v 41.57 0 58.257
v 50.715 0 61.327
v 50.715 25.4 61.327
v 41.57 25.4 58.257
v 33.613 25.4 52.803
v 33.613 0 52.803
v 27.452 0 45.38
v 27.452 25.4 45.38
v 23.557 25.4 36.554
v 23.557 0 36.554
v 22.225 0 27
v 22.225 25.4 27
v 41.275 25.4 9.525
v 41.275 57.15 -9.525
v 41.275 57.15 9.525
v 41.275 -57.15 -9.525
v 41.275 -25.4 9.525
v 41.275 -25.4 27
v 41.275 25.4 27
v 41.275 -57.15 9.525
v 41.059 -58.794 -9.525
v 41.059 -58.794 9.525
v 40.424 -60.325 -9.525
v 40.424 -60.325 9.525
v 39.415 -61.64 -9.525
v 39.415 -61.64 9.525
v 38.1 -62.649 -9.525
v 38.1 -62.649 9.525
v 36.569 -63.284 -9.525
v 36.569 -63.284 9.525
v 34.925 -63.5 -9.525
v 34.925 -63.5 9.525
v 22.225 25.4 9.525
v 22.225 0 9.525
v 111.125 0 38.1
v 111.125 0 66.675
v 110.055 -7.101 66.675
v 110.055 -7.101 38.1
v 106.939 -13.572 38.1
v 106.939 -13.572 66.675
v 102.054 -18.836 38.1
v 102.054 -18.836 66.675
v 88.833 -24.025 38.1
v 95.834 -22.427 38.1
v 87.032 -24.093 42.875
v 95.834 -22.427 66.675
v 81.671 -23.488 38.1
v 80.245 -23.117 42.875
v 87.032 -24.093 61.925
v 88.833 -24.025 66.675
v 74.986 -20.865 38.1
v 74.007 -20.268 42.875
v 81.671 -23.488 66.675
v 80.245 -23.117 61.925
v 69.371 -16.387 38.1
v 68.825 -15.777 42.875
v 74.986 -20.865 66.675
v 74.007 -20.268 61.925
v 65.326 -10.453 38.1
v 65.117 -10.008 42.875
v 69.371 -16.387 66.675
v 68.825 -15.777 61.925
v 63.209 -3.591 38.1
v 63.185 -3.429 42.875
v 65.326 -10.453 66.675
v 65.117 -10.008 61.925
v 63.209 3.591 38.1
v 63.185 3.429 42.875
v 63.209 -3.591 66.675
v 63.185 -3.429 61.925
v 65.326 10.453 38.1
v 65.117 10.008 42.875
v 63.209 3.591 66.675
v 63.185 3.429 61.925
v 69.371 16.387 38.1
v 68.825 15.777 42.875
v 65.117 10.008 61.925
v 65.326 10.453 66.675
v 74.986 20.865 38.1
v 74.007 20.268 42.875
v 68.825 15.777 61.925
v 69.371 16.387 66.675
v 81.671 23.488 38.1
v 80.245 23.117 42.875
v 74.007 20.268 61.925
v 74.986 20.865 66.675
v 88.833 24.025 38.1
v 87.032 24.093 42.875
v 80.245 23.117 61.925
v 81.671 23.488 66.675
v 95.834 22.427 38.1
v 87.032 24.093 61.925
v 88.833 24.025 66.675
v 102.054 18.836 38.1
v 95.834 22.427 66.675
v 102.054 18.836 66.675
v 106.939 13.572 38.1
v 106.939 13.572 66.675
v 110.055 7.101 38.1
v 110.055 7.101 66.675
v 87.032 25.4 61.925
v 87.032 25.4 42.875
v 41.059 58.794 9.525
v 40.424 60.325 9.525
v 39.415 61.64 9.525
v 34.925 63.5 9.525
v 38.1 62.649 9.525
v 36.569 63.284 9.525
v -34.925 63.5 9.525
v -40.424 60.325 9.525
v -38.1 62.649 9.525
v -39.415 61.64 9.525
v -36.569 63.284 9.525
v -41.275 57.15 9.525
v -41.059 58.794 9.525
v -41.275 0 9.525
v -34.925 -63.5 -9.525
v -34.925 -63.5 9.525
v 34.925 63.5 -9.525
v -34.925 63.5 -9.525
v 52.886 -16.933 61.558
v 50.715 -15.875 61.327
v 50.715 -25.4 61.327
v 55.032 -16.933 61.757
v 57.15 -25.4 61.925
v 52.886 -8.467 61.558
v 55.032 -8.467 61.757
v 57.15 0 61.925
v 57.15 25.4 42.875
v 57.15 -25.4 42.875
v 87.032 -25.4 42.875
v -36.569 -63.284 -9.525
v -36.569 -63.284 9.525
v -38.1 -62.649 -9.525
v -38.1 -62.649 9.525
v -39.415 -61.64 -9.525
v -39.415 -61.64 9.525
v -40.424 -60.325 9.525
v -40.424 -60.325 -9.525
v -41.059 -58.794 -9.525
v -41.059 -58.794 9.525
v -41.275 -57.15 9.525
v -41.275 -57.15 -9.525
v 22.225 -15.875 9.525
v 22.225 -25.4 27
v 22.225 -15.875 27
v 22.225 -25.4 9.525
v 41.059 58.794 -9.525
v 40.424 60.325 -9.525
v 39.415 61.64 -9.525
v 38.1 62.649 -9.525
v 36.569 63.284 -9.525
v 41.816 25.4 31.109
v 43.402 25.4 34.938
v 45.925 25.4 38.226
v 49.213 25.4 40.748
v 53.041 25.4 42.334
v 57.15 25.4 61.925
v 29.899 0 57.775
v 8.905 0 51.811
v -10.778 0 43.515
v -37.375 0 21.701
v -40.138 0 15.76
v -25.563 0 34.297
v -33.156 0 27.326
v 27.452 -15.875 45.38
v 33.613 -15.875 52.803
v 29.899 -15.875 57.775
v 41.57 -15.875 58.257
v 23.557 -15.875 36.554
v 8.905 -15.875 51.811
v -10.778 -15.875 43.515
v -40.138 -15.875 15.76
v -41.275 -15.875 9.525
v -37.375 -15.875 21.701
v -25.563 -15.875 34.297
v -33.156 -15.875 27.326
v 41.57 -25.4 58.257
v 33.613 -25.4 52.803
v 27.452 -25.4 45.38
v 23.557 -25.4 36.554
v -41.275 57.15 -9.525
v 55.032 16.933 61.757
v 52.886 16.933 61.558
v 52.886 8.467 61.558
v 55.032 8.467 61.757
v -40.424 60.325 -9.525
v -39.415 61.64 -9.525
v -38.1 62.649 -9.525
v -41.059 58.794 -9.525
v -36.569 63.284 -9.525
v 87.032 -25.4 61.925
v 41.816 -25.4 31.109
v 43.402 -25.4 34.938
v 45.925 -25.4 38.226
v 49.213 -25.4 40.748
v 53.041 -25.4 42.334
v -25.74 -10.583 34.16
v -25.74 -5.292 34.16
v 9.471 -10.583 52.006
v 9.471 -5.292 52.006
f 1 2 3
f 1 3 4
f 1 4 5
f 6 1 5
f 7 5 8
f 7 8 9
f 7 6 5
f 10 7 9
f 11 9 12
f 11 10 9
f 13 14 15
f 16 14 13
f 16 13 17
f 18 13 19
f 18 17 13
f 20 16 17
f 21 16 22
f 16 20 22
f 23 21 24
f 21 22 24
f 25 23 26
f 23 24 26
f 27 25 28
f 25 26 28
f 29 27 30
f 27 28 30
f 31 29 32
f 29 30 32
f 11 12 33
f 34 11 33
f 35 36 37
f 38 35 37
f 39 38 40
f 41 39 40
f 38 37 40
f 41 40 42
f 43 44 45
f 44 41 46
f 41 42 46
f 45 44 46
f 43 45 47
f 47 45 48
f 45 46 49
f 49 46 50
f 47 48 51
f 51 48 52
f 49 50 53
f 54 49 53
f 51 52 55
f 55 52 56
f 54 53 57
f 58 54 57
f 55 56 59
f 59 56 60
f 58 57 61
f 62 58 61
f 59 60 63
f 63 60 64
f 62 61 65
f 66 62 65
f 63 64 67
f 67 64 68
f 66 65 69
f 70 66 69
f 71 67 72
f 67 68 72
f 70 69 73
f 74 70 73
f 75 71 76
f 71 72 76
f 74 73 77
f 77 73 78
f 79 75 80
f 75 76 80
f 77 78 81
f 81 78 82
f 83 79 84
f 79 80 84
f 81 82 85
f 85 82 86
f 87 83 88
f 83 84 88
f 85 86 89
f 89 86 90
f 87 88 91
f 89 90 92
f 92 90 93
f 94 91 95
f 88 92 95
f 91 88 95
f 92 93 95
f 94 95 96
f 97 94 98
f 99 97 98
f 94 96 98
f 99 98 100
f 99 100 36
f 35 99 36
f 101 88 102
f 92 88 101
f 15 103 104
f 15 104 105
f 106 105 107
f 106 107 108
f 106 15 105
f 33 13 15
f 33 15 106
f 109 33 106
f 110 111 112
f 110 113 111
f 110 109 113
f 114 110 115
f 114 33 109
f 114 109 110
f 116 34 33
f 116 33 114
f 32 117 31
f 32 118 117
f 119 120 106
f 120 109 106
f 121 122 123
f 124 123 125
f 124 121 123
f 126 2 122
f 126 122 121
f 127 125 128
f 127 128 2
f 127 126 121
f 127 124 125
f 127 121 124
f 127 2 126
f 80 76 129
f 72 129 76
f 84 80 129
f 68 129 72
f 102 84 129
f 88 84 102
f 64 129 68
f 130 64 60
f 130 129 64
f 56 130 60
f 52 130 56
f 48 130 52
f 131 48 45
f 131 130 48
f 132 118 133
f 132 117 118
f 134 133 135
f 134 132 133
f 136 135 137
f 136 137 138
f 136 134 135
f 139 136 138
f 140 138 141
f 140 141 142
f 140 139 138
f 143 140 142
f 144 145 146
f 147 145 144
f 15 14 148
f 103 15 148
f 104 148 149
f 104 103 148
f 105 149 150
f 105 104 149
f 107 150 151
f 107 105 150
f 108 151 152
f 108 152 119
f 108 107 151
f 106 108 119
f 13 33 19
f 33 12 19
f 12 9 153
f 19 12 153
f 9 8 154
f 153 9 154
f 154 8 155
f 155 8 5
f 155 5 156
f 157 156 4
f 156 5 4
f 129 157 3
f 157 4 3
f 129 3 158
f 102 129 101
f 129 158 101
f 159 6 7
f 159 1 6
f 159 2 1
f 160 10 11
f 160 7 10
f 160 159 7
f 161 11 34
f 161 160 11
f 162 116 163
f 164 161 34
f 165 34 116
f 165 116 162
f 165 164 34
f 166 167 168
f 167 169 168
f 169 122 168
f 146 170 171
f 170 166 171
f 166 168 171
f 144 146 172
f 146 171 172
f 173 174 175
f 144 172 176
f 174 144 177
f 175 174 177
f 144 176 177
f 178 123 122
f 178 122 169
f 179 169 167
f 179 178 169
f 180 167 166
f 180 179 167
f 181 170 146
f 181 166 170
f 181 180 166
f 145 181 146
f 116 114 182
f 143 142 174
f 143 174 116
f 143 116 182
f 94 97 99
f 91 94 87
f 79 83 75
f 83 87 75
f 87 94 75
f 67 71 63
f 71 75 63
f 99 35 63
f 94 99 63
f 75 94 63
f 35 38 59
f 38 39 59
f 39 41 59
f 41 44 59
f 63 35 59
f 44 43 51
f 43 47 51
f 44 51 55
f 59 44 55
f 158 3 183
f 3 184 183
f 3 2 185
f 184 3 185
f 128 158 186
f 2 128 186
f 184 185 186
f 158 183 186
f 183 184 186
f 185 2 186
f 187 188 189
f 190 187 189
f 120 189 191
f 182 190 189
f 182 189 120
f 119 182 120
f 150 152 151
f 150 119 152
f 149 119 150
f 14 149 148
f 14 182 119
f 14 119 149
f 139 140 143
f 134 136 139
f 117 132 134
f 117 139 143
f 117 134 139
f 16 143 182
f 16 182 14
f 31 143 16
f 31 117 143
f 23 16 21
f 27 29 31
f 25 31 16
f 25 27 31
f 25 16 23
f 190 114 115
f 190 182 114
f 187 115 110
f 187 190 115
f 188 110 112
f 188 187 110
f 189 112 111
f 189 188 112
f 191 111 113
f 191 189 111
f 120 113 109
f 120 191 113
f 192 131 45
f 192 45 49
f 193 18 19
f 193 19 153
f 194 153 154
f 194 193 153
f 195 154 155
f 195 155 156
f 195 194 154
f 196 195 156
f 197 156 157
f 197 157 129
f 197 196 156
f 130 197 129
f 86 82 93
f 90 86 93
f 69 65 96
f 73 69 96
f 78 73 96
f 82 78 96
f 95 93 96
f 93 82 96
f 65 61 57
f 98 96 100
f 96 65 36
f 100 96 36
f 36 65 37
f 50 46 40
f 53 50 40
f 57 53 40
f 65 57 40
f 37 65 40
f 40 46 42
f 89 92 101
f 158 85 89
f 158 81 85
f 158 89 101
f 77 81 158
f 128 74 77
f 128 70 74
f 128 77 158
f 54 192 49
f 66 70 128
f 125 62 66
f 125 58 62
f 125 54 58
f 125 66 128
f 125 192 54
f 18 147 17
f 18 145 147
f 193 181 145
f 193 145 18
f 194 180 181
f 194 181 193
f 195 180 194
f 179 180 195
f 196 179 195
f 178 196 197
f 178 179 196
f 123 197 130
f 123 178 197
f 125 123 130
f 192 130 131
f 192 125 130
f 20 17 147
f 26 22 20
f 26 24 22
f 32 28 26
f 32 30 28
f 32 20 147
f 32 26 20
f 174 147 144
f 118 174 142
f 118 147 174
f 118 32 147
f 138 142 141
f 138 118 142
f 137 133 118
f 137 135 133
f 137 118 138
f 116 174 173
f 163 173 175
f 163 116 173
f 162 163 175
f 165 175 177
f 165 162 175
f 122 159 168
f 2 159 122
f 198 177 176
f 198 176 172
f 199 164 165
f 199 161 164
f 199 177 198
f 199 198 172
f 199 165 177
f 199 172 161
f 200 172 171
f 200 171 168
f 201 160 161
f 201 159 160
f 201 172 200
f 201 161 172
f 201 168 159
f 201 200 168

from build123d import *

# Parameters (mm, degrees)
F1_DEPTH = 63.5
F0_W     = 26.7074994694
F0_H     = 19.05
F2_DEPTH = 25.4
F3_DEPTH = 15.875
F5_R     = 6.35


with BuildPart() as f1:
    # F0 (on Front) → F1 (new body, symmetric)
    with BuildSketch(Plane.XZ):
        Polygon((-41.275, -9.525), (41.275, -9.525), (41.275, 9.525), (22.225, 9.525), (-41.275, 9.525), align=None)
    extrude(amount=F1_DEPTH, both=True)

    # F0 (on Front) → F2 (join, symmetric)
    with BuildSketch(Plane.XZ):
        with BuildLine():
            Line((22.225, 9.525), (41.275, 9.525))
            Line((41.275, 9.525), (41.275, 27.0002))
            ThreePointArc((41.275, 27.0002), (45.9246798487, 38.2255201513), (57.15, 42.8752))
            Line((57.15, 42.8752), (60.325, 42.8752))
            Line((60.325, 42.8752), (60.325, 61.9252))
            Line((60.325, 61.9252), (57.15, 61.9252))
            add(Edge.make_bspline(
                [(50.7148259904, 61.3272179373), (52.8977826503, 61.5734874191), (55.0462400607, 61.7732473961), (57.15, 61.9252)],
                knots=[105.6945195788, 105.6945195788, 105.6945195788, 105.6945195788, 111.5045361635, 111.5045361635, 111.5045361635, 111.5045361635], degree=3))
            ThreePointArc((50.7148259904, 61.3272179373), (30.2752527706, 49.3049884177), (22.225, 27.0002))
            Line((22.225, 27.0002), (22.225, 9.525))
        make_face()
        with Locations((73.6787497347, 52.4002)):
            Rectangle(F0_W, F0_H)
    extrude(amount=F2_DEPTH, both=True)

    # F0 (on Front) → F3 (join)
    with BuildSketch(Plane.XZ):
        with BuildLine():
            add(Edge.make_bspline(
                [(-41.275, 9.525), (-40.1260967037, 36.9751709766), (11.0029676748, 56.8471387181), (50.7148259904, 61.3272179373)],
                knots=[0, 0, 0, 0, 105.6945195788, 105.6945195788, 105.6945195788, 105.6945195788], degree=3))
            Line((-41.275, 9.525), (22.225, 9.525))
            Line((22.225, 9.525), (22.225, 27.0002))
            ThreePointArc((22.225, 27.0002), (30.2752527706, 49.3049884177), (50.7148259904, 61.3272179373))
        make_face()
    extrude(amount=F3_DEPTH)

    # F0 (on Front) → F4 (revolve)
    with BuildSketch(Plane.XZ):
        Polygon((87.0324994694, 61.9252), (87.0324994694, 42.8752), (87.0324994694, 38.1), (111.125, 38.1), (111.125, 66.675), (87.0324994694, 66.675), align=None)
    revolve(axis=Axis((87.0324994694, 0, 52.3875), (0, 0, -1)))

    # F5
    f5_edges = [f1.edges().sort_by_distance(p)[0] for p in [
        (41.275, -63.5, 0),
        (-41.275, -63.5, 0),
        (41.275, 63.5, 0),
        (-41.275, 63.5, 0),
    ]]
    fillet(f5_edges, radius=F5_R)


solid = f1.part
